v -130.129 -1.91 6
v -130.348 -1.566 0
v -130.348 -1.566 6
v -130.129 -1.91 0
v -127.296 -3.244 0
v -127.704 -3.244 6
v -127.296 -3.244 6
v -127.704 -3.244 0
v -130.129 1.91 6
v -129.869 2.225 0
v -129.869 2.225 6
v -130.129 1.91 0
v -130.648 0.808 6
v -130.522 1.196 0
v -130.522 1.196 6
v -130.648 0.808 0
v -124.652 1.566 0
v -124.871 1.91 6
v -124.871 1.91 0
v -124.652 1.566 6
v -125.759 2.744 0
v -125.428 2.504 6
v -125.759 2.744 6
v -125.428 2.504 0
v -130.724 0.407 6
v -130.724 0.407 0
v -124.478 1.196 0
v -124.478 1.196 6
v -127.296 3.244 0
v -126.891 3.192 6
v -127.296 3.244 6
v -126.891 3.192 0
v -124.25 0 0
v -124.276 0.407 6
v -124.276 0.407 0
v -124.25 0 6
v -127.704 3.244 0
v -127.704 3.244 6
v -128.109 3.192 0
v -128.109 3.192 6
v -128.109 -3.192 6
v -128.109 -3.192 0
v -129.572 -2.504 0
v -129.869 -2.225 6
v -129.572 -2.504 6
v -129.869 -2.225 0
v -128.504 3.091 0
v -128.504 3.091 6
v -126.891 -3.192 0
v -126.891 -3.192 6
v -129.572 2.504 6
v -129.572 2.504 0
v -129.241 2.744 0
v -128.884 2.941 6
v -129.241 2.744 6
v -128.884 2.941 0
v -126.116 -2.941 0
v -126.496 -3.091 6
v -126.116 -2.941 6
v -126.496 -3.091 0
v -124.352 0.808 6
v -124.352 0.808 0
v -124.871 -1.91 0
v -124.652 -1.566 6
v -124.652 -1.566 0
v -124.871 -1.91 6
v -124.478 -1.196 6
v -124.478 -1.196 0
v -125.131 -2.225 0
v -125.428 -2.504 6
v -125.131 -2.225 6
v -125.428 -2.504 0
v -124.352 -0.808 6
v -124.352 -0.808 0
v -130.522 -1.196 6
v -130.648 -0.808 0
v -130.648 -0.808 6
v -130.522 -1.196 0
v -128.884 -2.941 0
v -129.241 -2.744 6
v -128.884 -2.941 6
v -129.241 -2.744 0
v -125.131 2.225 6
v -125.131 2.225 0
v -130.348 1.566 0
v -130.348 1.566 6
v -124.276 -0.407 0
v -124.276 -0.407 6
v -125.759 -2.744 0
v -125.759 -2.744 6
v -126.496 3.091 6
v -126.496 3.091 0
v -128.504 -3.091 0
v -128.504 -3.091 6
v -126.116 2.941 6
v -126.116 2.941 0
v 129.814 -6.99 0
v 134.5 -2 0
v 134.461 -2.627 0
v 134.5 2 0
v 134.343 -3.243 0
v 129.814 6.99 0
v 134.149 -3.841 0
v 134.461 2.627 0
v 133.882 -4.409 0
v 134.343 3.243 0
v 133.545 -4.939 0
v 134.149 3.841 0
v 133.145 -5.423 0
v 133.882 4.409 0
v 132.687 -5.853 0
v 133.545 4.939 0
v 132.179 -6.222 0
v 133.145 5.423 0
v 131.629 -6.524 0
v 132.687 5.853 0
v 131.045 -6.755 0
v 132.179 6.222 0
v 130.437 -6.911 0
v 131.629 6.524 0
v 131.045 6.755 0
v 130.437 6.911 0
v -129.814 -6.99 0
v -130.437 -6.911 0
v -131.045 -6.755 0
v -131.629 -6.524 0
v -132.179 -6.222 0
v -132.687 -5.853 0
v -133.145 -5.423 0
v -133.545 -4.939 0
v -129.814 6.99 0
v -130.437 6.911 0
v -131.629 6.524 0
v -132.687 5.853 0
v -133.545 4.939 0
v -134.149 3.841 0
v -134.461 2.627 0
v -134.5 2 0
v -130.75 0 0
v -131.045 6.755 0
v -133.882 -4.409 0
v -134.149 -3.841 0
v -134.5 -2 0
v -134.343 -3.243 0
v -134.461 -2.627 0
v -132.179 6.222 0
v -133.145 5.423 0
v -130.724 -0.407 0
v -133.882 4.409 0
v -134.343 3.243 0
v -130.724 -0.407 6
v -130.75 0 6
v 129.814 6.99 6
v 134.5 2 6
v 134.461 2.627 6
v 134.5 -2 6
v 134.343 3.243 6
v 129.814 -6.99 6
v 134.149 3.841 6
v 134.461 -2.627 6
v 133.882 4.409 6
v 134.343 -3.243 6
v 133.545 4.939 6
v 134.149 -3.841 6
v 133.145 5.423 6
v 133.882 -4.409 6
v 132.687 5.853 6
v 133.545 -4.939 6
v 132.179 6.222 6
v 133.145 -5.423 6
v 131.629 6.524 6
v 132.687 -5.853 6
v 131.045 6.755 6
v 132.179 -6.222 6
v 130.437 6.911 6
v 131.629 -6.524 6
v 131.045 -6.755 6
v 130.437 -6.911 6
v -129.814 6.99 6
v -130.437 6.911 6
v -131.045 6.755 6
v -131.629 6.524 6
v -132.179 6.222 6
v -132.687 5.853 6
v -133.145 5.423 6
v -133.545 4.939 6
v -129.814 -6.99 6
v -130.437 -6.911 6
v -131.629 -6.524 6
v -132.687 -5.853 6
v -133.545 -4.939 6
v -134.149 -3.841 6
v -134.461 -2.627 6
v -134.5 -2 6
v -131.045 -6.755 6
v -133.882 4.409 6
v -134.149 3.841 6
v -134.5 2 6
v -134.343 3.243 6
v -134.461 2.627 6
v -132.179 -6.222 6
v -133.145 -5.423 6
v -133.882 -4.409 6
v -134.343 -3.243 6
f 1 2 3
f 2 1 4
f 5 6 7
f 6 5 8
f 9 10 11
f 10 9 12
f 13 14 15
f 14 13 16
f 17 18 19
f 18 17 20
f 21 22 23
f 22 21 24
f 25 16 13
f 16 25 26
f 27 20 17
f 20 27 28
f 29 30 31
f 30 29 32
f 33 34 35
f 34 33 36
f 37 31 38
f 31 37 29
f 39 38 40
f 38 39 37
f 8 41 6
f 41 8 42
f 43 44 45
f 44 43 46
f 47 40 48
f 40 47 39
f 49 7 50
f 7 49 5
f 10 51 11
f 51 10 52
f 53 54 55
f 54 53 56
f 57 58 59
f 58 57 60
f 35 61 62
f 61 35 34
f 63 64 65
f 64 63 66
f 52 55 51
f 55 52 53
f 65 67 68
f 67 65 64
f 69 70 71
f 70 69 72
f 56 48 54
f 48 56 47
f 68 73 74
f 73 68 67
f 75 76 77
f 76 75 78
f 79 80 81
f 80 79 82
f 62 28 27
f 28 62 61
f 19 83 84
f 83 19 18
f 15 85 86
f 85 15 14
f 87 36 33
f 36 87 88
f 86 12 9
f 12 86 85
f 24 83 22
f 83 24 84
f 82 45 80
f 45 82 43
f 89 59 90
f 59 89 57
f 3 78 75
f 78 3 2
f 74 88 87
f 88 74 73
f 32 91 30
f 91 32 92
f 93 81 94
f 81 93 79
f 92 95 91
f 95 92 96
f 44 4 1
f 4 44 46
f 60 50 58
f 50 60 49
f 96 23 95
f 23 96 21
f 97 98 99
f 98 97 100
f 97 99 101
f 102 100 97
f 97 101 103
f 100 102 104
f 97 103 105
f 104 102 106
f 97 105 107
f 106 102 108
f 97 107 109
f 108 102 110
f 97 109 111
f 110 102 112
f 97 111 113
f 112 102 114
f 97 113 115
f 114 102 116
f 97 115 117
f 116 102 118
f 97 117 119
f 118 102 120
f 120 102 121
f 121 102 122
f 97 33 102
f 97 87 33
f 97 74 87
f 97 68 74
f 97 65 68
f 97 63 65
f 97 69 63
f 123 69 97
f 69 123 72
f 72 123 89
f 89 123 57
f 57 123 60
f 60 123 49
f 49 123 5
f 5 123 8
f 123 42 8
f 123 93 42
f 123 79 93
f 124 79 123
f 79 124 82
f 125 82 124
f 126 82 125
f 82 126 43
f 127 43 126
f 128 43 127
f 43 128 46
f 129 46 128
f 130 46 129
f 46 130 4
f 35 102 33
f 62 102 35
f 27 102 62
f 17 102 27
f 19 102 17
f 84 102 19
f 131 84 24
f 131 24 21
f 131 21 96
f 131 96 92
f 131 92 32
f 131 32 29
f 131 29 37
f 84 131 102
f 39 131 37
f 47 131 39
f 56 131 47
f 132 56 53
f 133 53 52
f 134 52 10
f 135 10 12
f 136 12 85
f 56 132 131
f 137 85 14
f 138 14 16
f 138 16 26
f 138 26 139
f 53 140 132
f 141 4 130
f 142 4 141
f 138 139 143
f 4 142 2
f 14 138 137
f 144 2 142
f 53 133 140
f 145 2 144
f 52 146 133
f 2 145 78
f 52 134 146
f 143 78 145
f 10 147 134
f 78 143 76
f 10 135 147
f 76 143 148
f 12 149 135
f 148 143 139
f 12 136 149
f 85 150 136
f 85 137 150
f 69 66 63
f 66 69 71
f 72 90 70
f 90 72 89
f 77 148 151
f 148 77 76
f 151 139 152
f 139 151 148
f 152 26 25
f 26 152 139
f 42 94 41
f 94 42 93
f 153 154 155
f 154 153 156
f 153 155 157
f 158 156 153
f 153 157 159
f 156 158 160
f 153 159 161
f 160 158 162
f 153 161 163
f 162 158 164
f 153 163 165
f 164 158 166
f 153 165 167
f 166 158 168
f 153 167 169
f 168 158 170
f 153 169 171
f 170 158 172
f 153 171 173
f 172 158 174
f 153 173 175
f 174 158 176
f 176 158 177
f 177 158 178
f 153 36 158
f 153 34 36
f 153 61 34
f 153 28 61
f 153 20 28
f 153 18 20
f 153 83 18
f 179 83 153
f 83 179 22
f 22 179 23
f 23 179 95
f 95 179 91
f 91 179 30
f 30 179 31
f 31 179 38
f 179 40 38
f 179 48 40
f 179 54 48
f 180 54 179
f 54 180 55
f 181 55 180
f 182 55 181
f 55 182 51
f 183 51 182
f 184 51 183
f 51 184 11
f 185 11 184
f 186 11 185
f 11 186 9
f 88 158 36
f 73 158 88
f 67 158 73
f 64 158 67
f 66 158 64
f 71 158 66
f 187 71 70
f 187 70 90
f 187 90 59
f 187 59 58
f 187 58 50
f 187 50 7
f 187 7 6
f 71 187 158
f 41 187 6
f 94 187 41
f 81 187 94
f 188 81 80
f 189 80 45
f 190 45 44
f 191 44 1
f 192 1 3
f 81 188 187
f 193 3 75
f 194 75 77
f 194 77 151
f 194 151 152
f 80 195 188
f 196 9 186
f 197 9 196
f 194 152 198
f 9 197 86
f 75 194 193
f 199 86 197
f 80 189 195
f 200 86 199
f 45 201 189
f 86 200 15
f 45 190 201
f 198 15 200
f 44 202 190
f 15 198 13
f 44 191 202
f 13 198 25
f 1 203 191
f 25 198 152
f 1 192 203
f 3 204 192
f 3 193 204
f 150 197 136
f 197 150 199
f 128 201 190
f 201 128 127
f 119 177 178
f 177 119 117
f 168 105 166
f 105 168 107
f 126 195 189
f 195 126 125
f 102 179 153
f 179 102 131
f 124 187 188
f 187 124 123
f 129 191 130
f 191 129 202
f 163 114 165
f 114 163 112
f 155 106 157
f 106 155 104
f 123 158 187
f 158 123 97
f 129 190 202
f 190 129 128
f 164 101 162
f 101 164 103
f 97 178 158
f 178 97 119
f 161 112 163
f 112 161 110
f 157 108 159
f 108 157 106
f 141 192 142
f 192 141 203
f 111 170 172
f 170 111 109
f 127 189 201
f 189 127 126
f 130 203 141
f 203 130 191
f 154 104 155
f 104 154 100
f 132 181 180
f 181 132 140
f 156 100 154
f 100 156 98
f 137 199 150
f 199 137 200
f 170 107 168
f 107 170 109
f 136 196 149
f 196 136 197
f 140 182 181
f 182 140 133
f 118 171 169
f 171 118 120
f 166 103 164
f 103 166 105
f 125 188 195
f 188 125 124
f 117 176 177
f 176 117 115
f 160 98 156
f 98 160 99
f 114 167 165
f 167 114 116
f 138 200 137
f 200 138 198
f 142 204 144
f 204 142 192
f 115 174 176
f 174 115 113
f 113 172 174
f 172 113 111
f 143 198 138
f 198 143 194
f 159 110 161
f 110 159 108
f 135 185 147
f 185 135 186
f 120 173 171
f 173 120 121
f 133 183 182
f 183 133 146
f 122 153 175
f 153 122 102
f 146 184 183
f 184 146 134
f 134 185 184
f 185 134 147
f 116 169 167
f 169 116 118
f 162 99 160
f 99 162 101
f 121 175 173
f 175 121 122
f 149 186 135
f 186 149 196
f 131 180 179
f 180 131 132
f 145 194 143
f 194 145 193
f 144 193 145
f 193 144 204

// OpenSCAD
$fn = 50;


difference() {
	union() {
		hull() {
			translate(v = [-129.5000000000, 2.0000000000, 0]) {
				cylinder(h = 6, r = 5);
			}
			translate(v = [129.5000000000, 2.0000000000, 0]) {
				cylinder(h = 6, r = 5);
			}
			translate(v = [-129.5000000000, -2.0000000000, 0]) {
				cylinder(h = 6, r = 5);
			}
			translate(v = [129.5000000000, -2.0000000000, 0]) {
				cylinder(h = 6, r = 5);
			}
		}
	}
	union() {
		translate(v = [-127.5000000000, 0.0000000000, 0]) {
			cylinder(h = 6, r = 3.2500000000);
		}
		translate(v = [-127.5000000000, 0.0000000000, 0]) {
			cylinder(h = 6, r = 1.8000000000);
		}
		translate(v = [-127.5000000000, 0.0000000000, 0]) {
			cylinder(h = 6, r = 1.8000000000);
		}
		translate(v = [-127.5000000000, 0.0000000000, 0]) {
			cylinder(h = 6, r = 1.8000000000);
		}
	}
}
